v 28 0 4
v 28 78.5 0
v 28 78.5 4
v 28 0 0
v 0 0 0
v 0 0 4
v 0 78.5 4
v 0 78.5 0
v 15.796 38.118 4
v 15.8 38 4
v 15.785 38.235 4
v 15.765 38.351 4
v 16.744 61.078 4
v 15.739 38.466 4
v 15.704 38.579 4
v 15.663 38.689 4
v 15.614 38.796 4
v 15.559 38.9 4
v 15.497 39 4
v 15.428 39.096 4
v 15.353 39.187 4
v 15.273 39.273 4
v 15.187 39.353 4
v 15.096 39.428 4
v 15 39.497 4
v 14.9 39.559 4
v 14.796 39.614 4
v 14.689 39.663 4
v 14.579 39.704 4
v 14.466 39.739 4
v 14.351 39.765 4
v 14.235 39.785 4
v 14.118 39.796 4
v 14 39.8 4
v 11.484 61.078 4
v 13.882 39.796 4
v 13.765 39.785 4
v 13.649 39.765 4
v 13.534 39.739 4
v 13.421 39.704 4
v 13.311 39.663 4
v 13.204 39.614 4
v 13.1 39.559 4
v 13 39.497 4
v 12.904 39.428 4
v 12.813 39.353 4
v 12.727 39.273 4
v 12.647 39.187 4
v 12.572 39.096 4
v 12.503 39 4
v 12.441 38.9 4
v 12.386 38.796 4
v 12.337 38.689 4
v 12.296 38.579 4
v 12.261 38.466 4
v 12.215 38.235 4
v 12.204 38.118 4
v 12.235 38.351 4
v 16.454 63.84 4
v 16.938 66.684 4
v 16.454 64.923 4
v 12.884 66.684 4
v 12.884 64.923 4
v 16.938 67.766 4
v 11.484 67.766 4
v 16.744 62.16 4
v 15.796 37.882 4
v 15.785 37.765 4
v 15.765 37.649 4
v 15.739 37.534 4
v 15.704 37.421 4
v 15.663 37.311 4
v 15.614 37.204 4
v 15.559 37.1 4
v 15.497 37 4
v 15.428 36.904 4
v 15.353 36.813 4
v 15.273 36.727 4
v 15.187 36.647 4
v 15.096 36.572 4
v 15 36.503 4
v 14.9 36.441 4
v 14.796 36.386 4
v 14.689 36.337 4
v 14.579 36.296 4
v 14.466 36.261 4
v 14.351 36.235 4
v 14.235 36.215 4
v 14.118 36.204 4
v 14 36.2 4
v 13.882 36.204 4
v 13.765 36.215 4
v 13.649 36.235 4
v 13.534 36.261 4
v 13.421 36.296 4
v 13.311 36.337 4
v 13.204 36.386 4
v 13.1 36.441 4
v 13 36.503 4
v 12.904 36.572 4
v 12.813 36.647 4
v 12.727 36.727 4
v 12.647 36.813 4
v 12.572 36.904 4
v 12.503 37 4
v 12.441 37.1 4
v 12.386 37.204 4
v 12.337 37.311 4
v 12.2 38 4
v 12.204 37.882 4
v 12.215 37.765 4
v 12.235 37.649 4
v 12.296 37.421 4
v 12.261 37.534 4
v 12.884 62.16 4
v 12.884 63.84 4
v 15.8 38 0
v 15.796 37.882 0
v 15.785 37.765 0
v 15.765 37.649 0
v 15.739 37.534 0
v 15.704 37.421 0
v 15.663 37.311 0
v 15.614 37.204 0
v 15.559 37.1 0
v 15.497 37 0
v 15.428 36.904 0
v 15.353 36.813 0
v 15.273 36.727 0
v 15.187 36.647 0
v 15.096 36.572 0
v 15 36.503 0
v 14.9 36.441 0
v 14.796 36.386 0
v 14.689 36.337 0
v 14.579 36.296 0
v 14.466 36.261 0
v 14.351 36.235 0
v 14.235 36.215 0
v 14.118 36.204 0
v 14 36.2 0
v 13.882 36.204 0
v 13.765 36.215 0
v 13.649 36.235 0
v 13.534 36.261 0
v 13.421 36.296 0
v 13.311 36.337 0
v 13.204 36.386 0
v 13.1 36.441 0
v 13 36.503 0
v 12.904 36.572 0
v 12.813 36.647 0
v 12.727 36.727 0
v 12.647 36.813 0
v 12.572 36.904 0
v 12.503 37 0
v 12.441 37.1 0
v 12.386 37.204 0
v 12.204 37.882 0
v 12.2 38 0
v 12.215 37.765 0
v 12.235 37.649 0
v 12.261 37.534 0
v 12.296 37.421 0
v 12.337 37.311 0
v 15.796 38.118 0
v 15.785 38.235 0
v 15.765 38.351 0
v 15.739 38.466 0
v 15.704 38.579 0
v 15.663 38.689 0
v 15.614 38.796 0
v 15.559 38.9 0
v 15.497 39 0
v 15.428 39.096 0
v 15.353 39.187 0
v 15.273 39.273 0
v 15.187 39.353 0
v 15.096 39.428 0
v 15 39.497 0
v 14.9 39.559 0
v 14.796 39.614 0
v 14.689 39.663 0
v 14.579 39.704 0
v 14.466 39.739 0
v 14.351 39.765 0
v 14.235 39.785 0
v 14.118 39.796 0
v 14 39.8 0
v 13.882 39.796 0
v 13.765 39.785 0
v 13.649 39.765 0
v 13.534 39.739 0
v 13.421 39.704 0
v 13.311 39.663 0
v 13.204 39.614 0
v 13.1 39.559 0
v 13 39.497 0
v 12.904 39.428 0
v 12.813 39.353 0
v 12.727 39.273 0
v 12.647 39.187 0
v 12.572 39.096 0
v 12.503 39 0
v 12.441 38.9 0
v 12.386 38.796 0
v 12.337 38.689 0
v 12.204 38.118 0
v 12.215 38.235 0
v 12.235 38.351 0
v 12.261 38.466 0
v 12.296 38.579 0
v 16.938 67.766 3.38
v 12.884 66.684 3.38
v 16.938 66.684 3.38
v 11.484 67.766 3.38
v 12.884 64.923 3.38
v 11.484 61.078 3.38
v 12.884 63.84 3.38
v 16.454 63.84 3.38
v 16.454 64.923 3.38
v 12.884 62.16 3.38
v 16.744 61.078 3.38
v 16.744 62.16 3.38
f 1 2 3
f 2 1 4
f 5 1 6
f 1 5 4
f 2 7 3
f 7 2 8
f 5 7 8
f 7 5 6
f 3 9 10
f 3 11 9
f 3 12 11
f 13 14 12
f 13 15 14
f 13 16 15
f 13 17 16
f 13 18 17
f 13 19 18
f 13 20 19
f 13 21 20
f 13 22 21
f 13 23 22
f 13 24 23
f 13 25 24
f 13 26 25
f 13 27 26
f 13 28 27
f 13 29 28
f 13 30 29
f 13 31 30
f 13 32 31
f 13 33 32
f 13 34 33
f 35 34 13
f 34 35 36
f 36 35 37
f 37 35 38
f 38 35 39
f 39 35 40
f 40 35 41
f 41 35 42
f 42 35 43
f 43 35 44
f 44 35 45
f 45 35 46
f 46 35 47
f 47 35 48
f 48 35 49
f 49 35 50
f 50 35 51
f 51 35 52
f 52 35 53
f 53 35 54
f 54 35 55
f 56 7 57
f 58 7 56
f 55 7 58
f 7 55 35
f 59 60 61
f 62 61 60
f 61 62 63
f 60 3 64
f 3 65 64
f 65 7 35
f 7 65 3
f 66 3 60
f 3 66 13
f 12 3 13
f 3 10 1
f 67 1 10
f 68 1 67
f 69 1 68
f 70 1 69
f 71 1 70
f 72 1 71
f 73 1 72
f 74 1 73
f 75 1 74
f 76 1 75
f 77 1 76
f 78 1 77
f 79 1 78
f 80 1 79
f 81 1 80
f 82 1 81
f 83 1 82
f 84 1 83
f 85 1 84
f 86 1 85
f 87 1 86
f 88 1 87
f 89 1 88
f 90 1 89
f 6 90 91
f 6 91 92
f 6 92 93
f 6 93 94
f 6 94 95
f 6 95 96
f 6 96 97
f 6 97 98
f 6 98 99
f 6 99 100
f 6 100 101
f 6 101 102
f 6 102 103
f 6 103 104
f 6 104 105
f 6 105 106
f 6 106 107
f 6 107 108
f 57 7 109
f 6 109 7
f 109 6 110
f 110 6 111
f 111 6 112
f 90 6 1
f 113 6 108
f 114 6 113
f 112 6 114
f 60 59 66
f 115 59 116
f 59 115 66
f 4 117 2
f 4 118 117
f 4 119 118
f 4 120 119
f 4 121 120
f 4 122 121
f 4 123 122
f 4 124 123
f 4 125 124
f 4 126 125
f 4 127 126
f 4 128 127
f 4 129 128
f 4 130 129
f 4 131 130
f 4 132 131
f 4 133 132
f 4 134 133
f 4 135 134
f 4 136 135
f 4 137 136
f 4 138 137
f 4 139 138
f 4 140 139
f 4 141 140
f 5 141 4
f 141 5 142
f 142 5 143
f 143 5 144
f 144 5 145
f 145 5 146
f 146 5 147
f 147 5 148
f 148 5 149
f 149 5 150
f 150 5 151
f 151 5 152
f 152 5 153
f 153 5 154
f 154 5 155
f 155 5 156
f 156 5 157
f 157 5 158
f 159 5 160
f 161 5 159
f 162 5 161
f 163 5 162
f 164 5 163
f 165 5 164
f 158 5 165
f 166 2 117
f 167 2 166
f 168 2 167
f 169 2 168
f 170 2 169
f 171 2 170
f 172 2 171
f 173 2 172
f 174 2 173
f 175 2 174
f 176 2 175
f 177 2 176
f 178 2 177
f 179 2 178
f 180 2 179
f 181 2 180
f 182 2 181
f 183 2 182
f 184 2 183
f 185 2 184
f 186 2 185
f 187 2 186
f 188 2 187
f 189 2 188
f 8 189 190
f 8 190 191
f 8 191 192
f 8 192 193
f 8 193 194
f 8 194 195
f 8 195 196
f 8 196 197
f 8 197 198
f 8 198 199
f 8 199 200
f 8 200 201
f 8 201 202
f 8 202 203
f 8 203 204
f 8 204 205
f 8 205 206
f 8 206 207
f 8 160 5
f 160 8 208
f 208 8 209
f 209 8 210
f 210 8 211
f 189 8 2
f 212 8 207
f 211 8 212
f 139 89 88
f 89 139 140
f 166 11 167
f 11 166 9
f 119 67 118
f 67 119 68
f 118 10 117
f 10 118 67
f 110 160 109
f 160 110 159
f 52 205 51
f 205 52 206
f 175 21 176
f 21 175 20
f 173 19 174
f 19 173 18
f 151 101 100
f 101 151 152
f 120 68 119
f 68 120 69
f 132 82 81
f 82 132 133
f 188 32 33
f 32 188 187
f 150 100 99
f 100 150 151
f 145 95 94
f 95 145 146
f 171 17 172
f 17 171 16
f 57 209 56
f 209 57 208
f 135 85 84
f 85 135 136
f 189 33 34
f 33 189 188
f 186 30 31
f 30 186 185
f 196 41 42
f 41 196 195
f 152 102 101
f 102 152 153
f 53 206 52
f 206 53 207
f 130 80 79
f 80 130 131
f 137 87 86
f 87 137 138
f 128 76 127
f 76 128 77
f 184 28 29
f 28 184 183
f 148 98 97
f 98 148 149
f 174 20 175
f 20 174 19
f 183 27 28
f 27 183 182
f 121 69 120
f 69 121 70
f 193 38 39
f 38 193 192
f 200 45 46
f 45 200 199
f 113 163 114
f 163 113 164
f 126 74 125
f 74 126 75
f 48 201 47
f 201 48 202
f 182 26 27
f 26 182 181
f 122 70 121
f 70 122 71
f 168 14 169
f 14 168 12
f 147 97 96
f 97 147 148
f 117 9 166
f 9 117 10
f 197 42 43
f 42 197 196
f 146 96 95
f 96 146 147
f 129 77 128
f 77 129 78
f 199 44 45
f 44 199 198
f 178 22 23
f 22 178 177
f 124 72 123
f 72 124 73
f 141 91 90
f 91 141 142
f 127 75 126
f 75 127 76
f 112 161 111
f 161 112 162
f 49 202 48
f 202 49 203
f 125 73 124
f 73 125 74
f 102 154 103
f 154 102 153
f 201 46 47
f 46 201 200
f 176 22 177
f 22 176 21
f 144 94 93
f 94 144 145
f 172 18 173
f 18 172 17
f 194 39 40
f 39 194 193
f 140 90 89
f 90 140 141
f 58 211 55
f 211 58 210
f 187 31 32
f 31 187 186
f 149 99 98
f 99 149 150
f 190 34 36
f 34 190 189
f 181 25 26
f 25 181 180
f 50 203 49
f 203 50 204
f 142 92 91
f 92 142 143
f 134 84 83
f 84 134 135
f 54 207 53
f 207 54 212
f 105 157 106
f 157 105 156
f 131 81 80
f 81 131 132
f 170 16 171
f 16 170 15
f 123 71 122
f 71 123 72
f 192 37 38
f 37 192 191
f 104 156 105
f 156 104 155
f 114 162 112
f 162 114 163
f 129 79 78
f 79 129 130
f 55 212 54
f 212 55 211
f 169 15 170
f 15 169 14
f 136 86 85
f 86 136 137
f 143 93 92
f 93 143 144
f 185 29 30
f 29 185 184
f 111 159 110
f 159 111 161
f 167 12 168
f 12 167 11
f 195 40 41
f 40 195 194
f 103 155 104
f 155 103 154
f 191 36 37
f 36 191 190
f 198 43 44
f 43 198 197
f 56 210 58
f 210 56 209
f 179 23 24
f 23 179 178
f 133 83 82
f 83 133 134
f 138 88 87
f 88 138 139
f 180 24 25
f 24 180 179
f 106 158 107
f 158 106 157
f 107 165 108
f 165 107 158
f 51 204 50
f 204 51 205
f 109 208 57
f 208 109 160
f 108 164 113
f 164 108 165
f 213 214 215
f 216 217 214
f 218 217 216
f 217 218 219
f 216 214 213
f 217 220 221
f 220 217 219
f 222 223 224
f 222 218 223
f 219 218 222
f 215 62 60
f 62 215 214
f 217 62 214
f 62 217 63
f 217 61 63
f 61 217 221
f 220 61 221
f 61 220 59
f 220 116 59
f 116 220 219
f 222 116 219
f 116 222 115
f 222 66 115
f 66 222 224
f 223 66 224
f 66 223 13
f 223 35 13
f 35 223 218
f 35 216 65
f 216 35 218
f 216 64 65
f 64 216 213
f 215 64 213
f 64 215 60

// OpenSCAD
use <../../../tec_cold_block_mockup.scad>

support_psu_upright_export();
